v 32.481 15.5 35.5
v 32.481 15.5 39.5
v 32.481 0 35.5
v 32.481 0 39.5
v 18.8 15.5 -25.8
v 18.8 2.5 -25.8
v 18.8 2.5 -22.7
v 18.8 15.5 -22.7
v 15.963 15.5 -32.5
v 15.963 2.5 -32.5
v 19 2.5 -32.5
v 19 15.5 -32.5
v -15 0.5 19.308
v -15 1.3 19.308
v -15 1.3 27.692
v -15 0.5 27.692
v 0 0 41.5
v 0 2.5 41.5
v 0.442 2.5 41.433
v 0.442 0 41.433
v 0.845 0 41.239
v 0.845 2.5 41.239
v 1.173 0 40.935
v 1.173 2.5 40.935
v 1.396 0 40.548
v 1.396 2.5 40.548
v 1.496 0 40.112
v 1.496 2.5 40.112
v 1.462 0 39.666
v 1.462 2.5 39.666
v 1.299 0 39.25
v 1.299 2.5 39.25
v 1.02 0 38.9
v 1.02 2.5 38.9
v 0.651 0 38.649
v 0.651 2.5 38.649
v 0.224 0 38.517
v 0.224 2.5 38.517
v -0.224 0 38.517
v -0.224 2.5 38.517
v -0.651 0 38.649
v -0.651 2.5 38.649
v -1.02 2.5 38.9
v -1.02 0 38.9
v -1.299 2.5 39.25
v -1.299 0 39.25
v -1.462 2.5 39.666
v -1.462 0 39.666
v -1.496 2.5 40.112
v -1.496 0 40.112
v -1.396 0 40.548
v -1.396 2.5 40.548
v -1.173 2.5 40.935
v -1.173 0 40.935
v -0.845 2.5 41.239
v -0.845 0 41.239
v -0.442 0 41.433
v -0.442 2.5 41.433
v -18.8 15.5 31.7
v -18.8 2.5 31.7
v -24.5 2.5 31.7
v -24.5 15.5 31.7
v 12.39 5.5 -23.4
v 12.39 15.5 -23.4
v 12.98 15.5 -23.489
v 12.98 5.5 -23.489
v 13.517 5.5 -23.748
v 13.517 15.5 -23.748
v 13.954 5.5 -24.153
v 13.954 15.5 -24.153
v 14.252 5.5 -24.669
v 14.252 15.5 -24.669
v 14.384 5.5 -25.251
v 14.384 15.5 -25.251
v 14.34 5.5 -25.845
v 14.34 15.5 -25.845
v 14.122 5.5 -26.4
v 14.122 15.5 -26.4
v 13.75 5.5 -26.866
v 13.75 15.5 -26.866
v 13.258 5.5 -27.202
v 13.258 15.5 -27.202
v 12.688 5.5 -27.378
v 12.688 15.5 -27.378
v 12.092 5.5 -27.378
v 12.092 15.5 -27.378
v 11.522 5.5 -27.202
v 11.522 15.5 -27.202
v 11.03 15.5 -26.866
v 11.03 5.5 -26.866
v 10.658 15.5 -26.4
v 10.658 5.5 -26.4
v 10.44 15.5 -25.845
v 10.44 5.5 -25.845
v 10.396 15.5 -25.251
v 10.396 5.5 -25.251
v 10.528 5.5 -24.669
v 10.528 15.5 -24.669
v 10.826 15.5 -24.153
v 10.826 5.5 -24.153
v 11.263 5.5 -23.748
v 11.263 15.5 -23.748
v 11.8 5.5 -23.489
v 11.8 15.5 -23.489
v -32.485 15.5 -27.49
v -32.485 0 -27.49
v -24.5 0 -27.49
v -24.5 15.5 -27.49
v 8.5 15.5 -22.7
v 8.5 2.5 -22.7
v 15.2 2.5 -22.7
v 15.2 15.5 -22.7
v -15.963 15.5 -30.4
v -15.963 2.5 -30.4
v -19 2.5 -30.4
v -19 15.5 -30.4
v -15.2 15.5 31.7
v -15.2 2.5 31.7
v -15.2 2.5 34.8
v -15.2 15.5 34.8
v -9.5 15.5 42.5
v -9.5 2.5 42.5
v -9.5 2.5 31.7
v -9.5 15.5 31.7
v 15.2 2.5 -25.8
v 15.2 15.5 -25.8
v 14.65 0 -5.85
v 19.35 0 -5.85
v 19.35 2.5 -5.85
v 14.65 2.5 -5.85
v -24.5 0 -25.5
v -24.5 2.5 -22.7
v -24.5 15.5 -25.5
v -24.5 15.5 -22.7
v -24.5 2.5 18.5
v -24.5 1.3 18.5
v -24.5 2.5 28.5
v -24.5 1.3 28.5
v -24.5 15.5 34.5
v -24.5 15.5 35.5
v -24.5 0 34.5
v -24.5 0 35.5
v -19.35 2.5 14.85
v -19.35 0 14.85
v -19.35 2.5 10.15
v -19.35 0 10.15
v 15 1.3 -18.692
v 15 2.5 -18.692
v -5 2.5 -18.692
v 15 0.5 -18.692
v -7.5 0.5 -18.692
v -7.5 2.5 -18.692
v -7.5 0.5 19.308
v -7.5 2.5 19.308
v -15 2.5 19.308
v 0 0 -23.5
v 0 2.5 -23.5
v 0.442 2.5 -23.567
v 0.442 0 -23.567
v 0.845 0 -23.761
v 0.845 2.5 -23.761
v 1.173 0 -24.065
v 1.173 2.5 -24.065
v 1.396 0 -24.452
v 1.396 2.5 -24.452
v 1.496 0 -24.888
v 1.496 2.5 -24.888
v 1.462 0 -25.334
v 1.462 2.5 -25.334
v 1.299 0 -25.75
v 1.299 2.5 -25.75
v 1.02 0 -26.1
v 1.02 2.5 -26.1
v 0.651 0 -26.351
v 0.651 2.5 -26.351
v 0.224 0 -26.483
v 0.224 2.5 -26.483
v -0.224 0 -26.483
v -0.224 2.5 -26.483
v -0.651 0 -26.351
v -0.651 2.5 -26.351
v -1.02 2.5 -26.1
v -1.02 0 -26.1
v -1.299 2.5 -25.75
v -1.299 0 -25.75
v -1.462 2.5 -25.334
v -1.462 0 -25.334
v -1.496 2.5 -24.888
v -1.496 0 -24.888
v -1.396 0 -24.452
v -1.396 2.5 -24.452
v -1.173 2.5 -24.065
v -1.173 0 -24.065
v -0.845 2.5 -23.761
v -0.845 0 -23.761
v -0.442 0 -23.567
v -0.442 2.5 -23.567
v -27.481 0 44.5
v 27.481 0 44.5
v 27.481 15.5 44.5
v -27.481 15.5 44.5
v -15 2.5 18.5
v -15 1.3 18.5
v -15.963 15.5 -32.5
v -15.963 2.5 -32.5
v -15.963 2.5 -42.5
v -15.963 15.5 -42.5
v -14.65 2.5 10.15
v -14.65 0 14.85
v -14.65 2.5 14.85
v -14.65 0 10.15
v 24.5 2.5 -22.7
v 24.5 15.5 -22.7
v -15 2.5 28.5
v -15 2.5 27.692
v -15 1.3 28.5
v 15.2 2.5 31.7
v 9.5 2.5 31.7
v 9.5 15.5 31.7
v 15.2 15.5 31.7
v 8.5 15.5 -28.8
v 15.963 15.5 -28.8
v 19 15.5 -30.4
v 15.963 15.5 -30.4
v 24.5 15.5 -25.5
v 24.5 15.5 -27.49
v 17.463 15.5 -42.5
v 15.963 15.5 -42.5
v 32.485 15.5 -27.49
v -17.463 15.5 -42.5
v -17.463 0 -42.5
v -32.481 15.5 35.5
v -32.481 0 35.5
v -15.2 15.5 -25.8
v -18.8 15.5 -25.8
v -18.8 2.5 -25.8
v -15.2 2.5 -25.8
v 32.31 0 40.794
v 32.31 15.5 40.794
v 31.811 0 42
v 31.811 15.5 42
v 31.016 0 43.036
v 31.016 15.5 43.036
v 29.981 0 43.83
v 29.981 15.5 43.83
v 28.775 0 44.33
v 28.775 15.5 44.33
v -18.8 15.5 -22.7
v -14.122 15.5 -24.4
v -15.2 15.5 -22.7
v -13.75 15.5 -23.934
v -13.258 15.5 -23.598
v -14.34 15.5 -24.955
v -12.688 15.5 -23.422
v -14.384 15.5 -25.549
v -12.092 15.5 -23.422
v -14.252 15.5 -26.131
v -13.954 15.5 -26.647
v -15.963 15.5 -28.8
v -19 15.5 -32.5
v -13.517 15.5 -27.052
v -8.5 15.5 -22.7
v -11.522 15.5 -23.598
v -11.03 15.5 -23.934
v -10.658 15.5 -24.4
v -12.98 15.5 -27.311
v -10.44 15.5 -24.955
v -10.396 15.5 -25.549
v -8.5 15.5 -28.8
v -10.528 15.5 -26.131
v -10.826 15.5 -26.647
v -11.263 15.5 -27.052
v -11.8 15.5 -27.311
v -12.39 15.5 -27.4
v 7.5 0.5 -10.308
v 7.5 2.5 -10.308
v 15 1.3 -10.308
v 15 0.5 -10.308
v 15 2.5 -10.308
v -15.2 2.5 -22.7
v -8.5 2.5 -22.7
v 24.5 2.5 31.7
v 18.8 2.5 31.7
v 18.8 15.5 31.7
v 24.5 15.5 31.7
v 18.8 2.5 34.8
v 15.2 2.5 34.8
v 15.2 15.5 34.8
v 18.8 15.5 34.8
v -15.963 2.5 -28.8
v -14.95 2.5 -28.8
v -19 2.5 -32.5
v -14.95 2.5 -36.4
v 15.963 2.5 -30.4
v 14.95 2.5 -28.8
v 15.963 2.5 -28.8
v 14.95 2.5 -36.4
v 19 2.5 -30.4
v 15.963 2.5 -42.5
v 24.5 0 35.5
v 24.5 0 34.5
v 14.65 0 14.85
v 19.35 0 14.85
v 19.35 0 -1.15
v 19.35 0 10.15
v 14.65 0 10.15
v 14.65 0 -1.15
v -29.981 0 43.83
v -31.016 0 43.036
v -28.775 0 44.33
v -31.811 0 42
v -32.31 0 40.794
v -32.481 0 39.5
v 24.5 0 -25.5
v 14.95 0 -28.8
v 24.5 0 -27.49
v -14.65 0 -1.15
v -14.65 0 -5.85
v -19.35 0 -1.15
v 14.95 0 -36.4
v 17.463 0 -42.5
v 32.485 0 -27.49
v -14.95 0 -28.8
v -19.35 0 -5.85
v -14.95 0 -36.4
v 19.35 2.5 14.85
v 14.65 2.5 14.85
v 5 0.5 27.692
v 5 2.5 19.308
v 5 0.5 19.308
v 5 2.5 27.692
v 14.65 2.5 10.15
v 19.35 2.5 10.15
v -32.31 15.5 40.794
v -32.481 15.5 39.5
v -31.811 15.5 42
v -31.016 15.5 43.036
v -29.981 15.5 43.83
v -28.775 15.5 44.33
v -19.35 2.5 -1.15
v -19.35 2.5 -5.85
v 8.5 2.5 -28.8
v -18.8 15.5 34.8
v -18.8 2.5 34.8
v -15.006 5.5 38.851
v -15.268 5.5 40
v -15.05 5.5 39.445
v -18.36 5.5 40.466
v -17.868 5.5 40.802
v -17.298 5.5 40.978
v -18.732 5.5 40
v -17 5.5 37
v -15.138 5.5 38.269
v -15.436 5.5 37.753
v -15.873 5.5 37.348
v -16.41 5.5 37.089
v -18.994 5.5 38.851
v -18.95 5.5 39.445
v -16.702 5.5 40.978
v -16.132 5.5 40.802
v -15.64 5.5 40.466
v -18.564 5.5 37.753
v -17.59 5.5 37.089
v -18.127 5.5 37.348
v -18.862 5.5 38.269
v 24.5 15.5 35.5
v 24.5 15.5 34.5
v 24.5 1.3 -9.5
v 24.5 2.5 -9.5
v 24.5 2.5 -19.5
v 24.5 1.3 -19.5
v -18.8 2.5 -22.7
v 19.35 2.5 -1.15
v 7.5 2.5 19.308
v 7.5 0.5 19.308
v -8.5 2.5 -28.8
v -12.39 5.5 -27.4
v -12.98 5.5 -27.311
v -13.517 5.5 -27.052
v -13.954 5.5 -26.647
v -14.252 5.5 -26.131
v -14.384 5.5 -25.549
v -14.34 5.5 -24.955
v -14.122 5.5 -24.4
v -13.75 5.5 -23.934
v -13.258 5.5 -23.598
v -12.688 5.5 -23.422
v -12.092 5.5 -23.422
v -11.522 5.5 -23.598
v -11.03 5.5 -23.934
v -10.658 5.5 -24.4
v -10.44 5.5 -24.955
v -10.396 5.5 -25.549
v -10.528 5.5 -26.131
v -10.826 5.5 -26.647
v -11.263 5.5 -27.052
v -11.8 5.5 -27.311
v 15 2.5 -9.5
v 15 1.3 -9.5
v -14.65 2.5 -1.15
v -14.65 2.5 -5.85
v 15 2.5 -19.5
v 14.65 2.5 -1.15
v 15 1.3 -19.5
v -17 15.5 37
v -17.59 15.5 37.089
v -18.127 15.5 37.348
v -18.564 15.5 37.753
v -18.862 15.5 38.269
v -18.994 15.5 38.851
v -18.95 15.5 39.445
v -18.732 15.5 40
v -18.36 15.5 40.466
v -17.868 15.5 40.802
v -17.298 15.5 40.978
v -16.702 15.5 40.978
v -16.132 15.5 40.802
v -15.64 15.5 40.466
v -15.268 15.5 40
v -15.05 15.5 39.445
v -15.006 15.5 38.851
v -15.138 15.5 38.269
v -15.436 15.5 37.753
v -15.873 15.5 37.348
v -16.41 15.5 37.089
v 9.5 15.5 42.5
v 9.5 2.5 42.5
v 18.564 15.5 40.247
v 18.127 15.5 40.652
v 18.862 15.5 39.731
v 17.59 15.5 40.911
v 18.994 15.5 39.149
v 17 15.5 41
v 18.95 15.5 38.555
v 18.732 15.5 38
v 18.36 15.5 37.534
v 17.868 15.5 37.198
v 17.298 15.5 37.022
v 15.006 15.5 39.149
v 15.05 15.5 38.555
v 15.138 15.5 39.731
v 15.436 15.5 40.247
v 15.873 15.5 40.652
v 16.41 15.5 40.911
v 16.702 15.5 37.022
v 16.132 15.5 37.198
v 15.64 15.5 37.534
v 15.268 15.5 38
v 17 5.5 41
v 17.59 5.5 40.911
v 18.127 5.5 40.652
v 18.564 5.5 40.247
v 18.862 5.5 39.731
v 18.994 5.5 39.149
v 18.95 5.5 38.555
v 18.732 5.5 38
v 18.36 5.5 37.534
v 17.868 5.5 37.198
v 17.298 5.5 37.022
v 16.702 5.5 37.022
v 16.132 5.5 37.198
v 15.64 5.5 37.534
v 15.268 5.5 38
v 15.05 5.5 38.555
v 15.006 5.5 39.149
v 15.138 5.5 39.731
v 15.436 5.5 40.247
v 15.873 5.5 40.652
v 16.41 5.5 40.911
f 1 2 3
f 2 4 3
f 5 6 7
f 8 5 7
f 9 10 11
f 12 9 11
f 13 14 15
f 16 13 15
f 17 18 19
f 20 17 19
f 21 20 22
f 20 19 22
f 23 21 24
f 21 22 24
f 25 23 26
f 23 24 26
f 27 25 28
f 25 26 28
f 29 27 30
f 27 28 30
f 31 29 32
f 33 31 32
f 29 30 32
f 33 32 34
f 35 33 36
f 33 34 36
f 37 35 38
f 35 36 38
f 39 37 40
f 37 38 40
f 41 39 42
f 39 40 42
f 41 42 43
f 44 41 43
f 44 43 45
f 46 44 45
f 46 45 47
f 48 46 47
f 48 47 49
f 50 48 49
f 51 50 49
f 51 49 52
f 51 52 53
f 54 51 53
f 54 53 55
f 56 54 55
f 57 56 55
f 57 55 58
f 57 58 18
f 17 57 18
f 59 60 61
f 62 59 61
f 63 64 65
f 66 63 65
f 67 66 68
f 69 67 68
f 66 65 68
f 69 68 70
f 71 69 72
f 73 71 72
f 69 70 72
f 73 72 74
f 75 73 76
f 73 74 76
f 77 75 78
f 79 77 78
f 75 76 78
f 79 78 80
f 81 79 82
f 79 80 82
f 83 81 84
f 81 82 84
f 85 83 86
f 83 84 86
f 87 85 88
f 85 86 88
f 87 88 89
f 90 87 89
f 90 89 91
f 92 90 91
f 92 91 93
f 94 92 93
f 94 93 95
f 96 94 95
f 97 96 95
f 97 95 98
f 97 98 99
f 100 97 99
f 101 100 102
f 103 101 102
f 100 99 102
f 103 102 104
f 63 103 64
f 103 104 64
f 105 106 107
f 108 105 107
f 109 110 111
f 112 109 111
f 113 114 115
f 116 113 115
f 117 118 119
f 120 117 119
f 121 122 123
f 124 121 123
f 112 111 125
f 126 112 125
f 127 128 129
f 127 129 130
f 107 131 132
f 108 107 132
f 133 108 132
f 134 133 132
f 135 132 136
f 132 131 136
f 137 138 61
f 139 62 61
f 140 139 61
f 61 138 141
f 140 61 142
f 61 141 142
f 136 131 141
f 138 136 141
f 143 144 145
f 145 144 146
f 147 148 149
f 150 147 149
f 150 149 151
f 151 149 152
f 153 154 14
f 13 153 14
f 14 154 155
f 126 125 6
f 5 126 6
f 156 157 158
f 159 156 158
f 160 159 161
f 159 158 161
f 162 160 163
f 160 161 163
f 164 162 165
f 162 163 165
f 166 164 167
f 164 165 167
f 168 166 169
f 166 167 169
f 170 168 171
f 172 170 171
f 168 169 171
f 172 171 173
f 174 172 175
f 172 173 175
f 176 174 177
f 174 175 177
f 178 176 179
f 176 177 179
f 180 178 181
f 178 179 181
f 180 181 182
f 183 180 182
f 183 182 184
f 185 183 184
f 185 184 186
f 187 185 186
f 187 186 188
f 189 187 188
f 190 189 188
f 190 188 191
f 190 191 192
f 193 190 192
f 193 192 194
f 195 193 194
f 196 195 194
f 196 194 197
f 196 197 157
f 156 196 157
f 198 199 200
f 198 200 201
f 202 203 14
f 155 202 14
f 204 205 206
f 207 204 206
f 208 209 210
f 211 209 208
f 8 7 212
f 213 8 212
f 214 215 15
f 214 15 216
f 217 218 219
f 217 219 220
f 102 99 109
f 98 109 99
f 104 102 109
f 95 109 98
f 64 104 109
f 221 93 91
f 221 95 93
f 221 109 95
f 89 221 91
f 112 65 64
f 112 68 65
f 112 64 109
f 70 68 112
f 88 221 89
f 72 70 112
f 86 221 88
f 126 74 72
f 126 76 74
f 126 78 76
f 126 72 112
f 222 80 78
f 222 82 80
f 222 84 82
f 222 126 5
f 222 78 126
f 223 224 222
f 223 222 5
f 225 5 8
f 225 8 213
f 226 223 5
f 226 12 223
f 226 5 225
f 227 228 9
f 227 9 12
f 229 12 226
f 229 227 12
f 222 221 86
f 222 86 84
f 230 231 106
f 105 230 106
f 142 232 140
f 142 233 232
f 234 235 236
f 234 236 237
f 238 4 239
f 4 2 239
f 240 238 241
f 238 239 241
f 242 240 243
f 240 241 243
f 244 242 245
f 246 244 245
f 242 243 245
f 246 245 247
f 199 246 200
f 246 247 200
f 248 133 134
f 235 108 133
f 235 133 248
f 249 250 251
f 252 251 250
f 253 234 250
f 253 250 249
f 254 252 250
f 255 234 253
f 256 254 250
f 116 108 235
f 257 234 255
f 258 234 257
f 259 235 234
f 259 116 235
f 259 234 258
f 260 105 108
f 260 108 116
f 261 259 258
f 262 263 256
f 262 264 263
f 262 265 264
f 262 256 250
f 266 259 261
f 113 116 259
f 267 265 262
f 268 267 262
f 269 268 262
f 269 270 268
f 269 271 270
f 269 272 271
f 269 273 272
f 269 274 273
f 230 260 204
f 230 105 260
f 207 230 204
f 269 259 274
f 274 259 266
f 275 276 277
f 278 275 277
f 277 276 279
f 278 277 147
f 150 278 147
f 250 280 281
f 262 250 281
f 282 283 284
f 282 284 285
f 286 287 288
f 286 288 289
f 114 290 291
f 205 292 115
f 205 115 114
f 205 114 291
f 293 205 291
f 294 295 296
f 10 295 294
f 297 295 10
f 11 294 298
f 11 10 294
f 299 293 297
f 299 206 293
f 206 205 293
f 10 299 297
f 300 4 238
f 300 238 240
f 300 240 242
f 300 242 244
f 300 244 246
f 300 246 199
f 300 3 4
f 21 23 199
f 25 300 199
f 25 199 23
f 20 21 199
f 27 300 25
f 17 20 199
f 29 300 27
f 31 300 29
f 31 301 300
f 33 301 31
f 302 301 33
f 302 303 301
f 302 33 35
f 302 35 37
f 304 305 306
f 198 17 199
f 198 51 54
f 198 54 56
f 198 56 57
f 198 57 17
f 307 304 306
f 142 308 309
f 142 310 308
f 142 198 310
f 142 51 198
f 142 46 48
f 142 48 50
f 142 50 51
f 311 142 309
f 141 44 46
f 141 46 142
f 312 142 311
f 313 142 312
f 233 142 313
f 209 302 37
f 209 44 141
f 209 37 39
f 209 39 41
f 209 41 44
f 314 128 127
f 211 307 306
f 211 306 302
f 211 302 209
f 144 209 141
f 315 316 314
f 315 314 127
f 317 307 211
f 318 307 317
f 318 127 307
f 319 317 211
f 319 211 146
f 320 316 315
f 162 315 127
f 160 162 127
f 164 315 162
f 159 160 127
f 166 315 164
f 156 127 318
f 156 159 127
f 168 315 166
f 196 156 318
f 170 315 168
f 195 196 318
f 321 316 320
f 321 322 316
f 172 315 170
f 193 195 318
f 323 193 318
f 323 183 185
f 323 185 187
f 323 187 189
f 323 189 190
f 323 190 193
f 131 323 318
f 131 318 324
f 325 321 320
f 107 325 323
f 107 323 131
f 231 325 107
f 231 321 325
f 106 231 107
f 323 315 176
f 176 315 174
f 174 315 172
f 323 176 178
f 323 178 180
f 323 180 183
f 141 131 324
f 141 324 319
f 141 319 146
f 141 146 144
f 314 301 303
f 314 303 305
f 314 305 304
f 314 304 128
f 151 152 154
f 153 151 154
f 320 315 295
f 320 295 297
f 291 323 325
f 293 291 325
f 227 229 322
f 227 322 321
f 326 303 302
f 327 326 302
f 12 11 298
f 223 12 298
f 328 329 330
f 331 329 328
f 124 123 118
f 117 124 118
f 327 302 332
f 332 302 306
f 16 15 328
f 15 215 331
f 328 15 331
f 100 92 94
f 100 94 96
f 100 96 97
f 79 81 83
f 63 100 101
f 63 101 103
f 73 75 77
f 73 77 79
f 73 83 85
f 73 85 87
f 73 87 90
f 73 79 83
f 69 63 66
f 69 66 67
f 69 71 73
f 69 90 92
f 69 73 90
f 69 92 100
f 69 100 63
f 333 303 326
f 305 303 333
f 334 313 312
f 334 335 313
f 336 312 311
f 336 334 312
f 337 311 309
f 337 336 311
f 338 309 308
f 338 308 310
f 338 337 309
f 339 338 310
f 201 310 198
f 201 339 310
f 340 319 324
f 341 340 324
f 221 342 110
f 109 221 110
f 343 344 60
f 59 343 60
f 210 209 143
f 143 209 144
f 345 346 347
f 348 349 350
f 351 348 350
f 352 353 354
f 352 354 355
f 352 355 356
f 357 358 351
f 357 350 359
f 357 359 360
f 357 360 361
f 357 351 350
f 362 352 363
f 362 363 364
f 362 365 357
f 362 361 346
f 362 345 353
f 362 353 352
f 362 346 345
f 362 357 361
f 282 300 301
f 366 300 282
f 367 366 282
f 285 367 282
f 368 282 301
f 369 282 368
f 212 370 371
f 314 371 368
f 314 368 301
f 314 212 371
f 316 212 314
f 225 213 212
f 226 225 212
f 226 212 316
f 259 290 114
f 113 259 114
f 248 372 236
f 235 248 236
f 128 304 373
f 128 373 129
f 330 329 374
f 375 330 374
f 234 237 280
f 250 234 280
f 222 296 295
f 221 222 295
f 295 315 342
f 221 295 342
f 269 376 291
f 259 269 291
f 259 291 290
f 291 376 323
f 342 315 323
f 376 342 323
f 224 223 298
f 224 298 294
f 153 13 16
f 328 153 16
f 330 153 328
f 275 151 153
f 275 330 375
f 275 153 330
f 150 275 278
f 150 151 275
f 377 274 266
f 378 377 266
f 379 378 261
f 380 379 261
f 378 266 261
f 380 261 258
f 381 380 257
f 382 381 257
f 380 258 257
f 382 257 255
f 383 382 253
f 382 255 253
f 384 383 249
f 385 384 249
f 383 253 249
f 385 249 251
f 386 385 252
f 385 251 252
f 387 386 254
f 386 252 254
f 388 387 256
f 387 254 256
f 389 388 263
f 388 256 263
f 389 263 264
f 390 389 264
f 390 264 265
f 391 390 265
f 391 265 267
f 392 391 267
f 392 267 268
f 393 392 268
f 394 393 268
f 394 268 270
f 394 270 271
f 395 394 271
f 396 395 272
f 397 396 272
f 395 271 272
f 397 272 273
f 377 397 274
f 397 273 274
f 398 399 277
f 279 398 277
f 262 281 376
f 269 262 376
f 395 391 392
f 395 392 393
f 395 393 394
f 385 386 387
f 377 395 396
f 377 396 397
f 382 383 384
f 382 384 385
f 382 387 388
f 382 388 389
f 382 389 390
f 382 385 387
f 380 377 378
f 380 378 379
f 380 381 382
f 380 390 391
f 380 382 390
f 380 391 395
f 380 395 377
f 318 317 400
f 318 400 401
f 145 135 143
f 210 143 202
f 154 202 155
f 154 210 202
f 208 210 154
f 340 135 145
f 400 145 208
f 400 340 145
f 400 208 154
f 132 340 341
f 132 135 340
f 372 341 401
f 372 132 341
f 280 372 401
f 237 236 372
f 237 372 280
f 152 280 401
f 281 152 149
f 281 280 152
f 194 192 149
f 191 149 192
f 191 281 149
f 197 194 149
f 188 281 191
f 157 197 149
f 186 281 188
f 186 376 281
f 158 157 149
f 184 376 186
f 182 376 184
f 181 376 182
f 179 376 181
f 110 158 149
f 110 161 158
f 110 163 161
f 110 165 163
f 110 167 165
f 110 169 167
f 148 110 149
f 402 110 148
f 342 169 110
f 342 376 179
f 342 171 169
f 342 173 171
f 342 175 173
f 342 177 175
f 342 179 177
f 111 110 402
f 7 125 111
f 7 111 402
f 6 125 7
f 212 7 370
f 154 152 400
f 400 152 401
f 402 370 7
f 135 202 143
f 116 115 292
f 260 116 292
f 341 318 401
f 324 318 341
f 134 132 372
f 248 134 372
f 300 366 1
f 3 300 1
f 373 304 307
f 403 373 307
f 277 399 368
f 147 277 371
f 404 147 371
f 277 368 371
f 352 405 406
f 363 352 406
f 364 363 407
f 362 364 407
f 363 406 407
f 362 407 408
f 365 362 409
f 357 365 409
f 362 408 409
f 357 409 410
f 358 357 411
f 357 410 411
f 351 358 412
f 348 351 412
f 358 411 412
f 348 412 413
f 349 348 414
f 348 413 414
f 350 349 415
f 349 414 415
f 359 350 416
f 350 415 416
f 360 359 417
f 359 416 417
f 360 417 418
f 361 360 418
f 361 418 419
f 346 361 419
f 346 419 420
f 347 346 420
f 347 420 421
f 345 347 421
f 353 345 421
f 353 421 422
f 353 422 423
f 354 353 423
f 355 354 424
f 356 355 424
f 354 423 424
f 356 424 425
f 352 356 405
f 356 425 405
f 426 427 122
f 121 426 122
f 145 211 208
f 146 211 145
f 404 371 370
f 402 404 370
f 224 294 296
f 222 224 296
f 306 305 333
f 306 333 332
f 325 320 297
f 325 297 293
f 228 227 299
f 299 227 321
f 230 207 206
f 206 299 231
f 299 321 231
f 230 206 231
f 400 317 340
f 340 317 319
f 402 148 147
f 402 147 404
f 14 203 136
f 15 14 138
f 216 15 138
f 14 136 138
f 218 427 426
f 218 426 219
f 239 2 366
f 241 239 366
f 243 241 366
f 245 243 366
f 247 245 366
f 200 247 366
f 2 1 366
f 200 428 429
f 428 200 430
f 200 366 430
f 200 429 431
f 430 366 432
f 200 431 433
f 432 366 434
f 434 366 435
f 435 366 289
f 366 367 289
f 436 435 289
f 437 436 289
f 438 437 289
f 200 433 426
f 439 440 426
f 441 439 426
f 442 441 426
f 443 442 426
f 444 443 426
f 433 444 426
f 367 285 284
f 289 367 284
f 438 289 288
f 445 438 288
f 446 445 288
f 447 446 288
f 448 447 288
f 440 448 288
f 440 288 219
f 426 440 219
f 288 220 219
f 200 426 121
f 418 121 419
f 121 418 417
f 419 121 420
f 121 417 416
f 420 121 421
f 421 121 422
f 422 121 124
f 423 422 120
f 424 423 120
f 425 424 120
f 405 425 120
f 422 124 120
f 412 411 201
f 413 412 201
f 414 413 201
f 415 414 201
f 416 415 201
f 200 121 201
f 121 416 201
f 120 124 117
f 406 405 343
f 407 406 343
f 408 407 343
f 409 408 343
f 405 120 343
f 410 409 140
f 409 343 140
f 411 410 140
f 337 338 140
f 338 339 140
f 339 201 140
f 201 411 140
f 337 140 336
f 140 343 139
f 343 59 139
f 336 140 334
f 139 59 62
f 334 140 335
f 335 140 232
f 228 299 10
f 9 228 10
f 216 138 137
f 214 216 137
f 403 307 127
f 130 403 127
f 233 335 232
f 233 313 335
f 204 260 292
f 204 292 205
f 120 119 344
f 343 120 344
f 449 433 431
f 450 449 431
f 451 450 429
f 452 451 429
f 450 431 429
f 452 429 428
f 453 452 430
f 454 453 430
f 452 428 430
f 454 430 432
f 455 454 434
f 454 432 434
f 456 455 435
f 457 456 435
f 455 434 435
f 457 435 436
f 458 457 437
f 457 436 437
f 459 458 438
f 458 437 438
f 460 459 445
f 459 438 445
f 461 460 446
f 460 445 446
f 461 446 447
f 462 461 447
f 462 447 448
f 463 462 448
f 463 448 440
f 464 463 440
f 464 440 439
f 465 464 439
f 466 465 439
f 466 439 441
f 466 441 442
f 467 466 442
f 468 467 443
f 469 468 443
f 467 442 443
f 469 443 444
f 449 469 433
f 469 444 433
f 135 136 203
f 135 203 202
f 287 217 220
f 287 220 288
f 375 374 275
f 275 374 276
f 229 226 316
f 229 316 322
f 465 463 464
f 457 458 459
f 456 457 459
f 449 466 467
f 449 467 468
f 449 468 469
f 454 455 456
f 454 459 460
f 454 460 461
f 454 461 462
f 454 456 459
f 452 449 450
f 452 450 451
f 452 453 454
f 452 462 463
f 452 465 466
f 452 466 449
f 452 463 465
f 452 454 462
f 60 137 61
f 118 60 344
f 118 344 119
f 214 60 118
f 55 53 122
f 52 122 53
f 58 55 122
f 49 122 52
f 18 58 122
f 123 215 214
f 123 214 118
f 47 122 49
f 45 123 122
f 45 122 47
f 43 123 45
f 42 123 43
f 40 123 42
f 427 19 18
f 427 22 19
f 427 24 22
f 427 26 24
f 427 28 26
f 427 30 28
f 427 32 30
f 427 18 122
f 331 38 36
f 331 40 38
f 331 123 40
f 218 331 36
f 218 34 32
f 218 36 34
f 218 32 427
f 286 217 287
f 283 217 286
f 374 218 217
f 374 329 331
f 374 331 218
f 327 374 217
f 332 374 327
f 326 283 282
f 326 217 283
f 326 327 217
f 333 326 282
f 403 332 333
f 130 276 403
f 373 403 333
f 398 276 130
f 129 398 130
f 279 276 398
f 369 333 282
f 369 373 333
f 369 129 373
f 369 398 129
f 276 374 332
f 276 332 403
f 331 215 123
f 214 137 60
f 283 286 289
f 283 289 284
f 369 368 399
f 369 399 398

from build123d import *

# Parameters (mm, degrees)
SKETCH1_W           = 70
SKETCH1_H           = 85
BOSS_EXTRUDE1_DEPTH = 2.5
SKETCH2_W           = 10.5
SKETCH2_H           = 60
CUT_EXTRUDE1_DEPTH  = 10
SKETCH3_W           = 2.519429159
SKETCH3_H           = 8
CUT_EXTRUDE2_DEPTH  = 10
SKETCH4_W           = 4.7
SKETCH4_H           = 4.7
SKETCH4_W_2         = 29.9
SKETCH4_H_2         = 7.6
CUT_EXTRUDE3_DEPTH  = 10
BOSS_EXTRUDE2_DEPTH = 13
SKETCH8_W           = 10
SKETCH8_H           = 1.2
CUT_EXTRUDE6_DEPTH  = 9.5
SKETCH9_R           = 6.15
CUT_EXTRUDE7_DEPTH  = 20
SKETCH10_W          = 10
SKETCH10_H          = 1.2
CUT_EXTRUDE8_DEPTH  = 9.5
SKETCH11_R          = 6.15
CUT_EXTRUDE9_DEPTH  = 20
CUT_EXTRUDE10_DEPTH = 1.2
SKETCH13_W          = 3
SKETCH13_H          = 4.191956584
CUT_EXTRUDE11_DEPTH = 1.2
SKETCH15_R          = 1.5
CUT_EXTRUDE12_DEPTH = 10
SKETCH16_R          = 2
CUT_EXTRUDE13_DEPTH = 10
SKETCH17_W          = 64.961141682
SKETCH17_H          = 2
BOSS_EXTRUDE3_DEPTH = 15.5
FILLET1_R           = 5
SKETCH18_W          = 7.984996169
SKETCH18_H          = 62.989999862
CUT_EXTRUDE14_DEPTH = 50
CUT_EXTRUDE15_DEPTH = 2


with BuildPart() as part:
    # Sketch1 → Boss-Extrude1 (new body)
    with BuildSketch(Plane(origin=(0, 0, 0), x_dir=(1, 0, 0), z_dir=(0, 1, 0))):
        Rectangle(SKETCH1_W, SKETCH1_H)
    extrude(amount=BOSS_EXTRUDE1_DEPTH)

    # Sketch2 → Cut-Extrude1 (cut)
    with BuildSketch(Plane(origin=(0, 0, 0), x_dir=(-1, 0, 0), z_dir=(0, -1, 0))):
        with Locations((-29.75, -4.5)):
            Rectangle(SKETCH2_W, SKETCH2_H)
        with Locations((29.75, -4.5)):
            Rectangle(SKETCH2_W, SKETCH2_H)
    extrude(amount=-CUT_EXTRUDE1_DEPTH, mode=Mode.SUBTRACT)

    # Sketch3 → Cut-Extrude2 (cut)
    with BuildSketch(Plane(origin=(0, 2.5, 0), x_dir=(1, 0, 0), z_dir=(0, 1, 0))):
        Polygon((17.462549034, 42.5), (35, 42.5), (35, 25.5), (32.484854108, 25.5), (32.484996169, 27.489999862), align=None)
        with Locations((33.740285421, -38.5)):
            Rectangle(SKETCH3_W, SKETCH3_H)
        with Locations((-33.740285421, -38.5)):
            Rectangle(SKETCH3_W, SKETCH3_H)
        Polygon((-32.484996169, 27.489999862), (-17.462549034, 42.5), (-35, 42.5), (-35, 25.5), (-32.484854108, 25.5), align=None)
    extrude(amount=-CUT_EXTRUDE2_DEPTH, mode=Mode.SUBTRACT)

    # Sketch4 → Cut-Extrude3 (cut)
    with BuildSketch(Plane(origin=(0, 0, 0), x_dir=(-1, 0, 0), z_dir=(0, -1, 0))):
        with Locations((-17, 3.5)):
            Rectangle(SKETCH4_W, SKETCH4_H)
        with Locations((-17, -12.5)):
            Rectangle(SKETCH4_W, SKETCH4_H)
        with Locations((17, -12.5)):
            Rectangle(SKETCH4_W, SKETCH4_H)
        with Locations((17, 3.5)):
            Rectangle(SKETCH4_W, SKETCH4_H)
        with Locations((0, 32.6)):
            Rectangle(SKETCH4_W_2, SKETCH4_H_2)
    extrude(amount=-CUT_EXTRUDE3_DEPTH, mode=Mode.SUBTRACT)

    # Sketch5 → Boss-Extrude2 (add)
    with BuildSketch(Plane(origin=(0, 2.5, 0), x_dir=(1, 0, 0), z_dir=(0, 1, 0))):
        Polygon((-32.484996169, 27.489999862), (-32.484854108, 25.5), (-24.5, 25.5), (-24.5, 22.7), (-18.8, 22.7), (-18.8, 25.8), (-15.2, 25.8), (-15.2, 22.7), (-8.5, 22.7), (-8.5, 28.8), (-15.962549034, 28.8), (-15.962549034, 30.4), (-19, 30.4), (-19, 32.5), (-15.962549034, 32.5), (-15.962549034, 42.5), (-17.462549034, 42.5), align=None)
        Polygon((-9.5, -42.5), (-9.5, -31.7), (-15.2, -31.7), (-15.2, -34.8), (-18.8, -34.8), (-18.8, -31.7), (-24.5, -31.7), (-24.5, -34.5), (-32.480570841, -34.5), (-32.480570841, -42.5), align=None)
        Polygon((32.480570841, -42.5), (9.5, -42.5), (9.5, -31.7), (15.2, -31.7), (15.2, -34.8), (18.8, -34.8), (18.8, -31.7), (24.5, -31.7), (24.5, -34.5), (32.480570841, -34.5), align=None)
        Polygon((15.962549034, 30.4), (15.962549034, 28.8), (8.5, 28.8), (8.5, 22.7), (15.2, 22.7), (15.2, 25.8), (18.8, 25.8), (18.8, 22.7), (24.5, 22.7), (24.5, 25.5), (32.484854108, 25.5), (32.484996169, 27.489999862), (17.462549034, 42.5), (15.962549034, 42.5), (15.962549034, 32.5), (19, 32.5), (19, 30.4), align=None)
    extrude(amount=BOSS_EXTRUDE2_DEPTH)

    # Sketch8 → Cut-Extrude6 (cut)
    with BuildSketch(Plane.ZY.offset(24.5)):
        with Locations((23.5, 1.9)):
            Rectangle(SKETCH8_W, SKETCH8_H)
    extrude(amount=-CUT_EXTRUDE6_DEPTH, mode=Mode.SUBTRACT)

    # Sketch9 → Cut-Extrude7 (cut)
    with BuildSketch(Plane.ZY.offset(15)):
        with Locations((23.5, 7)):
            Circle(SKETCH9_R)
    extrude(amount=-CUT_EXTRUDE7_DEPTH, mode=Mode.SUBTRACT)

    # Sketch10 → Cut-Extrude8 (cut)
    with BuildSketch(Plane(origin=(24.5, 0, 0), x_dir=(0, 0, -1), z_dir=(1, 0, 0))):
        with Locations((14.5, 1.9)):
            Rectangle(SKETCH10_W, SKETCH10_H)
    extrude(amount=-CUT_EXTRUDE8_DEPTH, mode=Mode.SUBTRACT)

    # Sketch11 → Cut-Extrude9 (cut)
    with BuildSketch(Plane(origin=(15, 0, 0), x_dir=(0, 0, -1), z_dir=(1, 0, 0))):
        with Locations((14.5, 7)):
            Circle(SKETCH11_R)
    extrude(amount=-CUT_EXTRUDE9_DEPTH, mode=Mode.SUBTRACT)

    # Sketch12 → Cut-Extrude10 (cut)
    with BuildSketch(Plane(origin=(0, 2.5, 0), x_dir=(1, 0, 0), z_dir=(0, 1, 0))):
        Polygon((5, -19.308043416), (7.5, -19.308043416), (7.5, 10.308043416), (-7.5, 10.308043416), (-7.5, -19.308043416), align=None)
    extrude(amount=-CUT_EXTRUDE10_DEPTH, mode=Mode.SUBTRACT)

    # Sketch13 → Cut-Extrude11 (cut)
    with BuildSketch(Plane(origin=(0, 2.5, 0), x_dir=(1, 0, 0), z_dir=(0, 1, 0))):
        with Locations((-0.8, 12.404021708)):
            Rectangle(SKETCH13_W, SKETCH13_H)
        with Locations((0.8, -21.404021708)):
            Rectangle(SKETCH13_W, SKETCH13_H)
    extrude(amount=-CUT_EXTRUDE11_DEPTH, mode=Mode.SUBTRACT)

    # Sketch15 → Cut-Extrude12 (cut)
    with BuildSketch(Plane(origin=(0, 2.5, 0), x_dir=(1, 0, 0), z_dir=(0, 1, 0))):
        with Locations(Location((0, 25, 0), (0, 0, 270))):
            Circle(SKETCH15_R)
        with Locations(Location((0, -40, 0), (0, 0, 270))):
            Circle(SKETCH15_R)
    extrude(amount=-CUT_EXTRUDE12_DEPTH, mode=Mode.SUBTRACT)

    # Sketch16 → Cut-Extrude13 (cut)
    with BuildSketch(Plane(origin=(0, 15.5, 0), x_dir=(1, 0, 0), z_dir=(0, 1, 0))):
        with Locations(Location((12.39, 25.4, 0), (0, 0, 270))):
            Circle(SKETCH16_R)
        with Locations(Location((17, -39, 0), (0, 0, 270))):
            Circle(SKETCH16_R)
        with Locations(Location((-17, -39, 0), (0, 0, 90))):
            Circle(SKETCH16_R)
        with Locations(Location((-12.39, 25.4, 0), (0, 0, 90))):
            Circle(SKETCH16_R)
    extrude(amount=-CUT_EXTRUDE13_DEPTH, mode=Mode.SUBTRACT)

    # Sketch17 → Boss-Extrude3 (add)
    with BuildSketch(Plane(origin=(0, 0, 0), x_dir=(-1, 0, 0), z_dir=(0, -1, 0))):
        with Locations((0, -43.5)):
            Rectangle(SKETCH17_W, SKETCH17_H)
    extrude(amount=-BOSS_EXTRUDE3_DEPTH)

    # Fillet1
    fillet1_edges = [part.edges().sort_by_distance(p)[0] for p in [
        (-32.480570841, 7.75, 44.5),
        (32.480570841, 7.75, 44.5),
    ]]
    fillet(fillet1_edges, radius=FILLET1_R)

    # Sketch18 → Cut-Extrude14 (cut, symmetric)
    with BuildSketch(Plane(origin=(0, 2.5, 0), x_dir=(1, 0, 0), z_dir=(0, 1, 0))):
        with Locations((-28.492498084, -4.005000069)):
            Rectangle(SKETCH18_W, SKETCH18_H)
        with Locations((28.492498084, -4.005000069)):
            Rectangle(SKETCH18_W, SKETCH18_H)
    extrude(amount=CUT_EXTRUDE14_DEPTH, both=True, mode=Mode.SUBTRACT)

    # Sketch19 → Cut-Extrude15 (cut)
    with BuildSketch(Plane(origin=(0, 2.5, 0), x_dir=(1, 0, 0), z_dir=(0, 1, 0))):
        Polygon((15, 18.691956584), (-5, 18.691956584), (-7.5, 18.691956584), (-7.5, -19.308043416), (-15, -19.308043416), (-15, -27.691956584), (5, -27.691956584), (5, -19.308043416), (7.5, -19.308043416), (7.5, 10.308043416), (15, 10.308043416), align=None)
    extrude(amount=-CUT_EXTRUDE15_DEPTH, mode=Mode.SUBTRACT)


solid = part.part
